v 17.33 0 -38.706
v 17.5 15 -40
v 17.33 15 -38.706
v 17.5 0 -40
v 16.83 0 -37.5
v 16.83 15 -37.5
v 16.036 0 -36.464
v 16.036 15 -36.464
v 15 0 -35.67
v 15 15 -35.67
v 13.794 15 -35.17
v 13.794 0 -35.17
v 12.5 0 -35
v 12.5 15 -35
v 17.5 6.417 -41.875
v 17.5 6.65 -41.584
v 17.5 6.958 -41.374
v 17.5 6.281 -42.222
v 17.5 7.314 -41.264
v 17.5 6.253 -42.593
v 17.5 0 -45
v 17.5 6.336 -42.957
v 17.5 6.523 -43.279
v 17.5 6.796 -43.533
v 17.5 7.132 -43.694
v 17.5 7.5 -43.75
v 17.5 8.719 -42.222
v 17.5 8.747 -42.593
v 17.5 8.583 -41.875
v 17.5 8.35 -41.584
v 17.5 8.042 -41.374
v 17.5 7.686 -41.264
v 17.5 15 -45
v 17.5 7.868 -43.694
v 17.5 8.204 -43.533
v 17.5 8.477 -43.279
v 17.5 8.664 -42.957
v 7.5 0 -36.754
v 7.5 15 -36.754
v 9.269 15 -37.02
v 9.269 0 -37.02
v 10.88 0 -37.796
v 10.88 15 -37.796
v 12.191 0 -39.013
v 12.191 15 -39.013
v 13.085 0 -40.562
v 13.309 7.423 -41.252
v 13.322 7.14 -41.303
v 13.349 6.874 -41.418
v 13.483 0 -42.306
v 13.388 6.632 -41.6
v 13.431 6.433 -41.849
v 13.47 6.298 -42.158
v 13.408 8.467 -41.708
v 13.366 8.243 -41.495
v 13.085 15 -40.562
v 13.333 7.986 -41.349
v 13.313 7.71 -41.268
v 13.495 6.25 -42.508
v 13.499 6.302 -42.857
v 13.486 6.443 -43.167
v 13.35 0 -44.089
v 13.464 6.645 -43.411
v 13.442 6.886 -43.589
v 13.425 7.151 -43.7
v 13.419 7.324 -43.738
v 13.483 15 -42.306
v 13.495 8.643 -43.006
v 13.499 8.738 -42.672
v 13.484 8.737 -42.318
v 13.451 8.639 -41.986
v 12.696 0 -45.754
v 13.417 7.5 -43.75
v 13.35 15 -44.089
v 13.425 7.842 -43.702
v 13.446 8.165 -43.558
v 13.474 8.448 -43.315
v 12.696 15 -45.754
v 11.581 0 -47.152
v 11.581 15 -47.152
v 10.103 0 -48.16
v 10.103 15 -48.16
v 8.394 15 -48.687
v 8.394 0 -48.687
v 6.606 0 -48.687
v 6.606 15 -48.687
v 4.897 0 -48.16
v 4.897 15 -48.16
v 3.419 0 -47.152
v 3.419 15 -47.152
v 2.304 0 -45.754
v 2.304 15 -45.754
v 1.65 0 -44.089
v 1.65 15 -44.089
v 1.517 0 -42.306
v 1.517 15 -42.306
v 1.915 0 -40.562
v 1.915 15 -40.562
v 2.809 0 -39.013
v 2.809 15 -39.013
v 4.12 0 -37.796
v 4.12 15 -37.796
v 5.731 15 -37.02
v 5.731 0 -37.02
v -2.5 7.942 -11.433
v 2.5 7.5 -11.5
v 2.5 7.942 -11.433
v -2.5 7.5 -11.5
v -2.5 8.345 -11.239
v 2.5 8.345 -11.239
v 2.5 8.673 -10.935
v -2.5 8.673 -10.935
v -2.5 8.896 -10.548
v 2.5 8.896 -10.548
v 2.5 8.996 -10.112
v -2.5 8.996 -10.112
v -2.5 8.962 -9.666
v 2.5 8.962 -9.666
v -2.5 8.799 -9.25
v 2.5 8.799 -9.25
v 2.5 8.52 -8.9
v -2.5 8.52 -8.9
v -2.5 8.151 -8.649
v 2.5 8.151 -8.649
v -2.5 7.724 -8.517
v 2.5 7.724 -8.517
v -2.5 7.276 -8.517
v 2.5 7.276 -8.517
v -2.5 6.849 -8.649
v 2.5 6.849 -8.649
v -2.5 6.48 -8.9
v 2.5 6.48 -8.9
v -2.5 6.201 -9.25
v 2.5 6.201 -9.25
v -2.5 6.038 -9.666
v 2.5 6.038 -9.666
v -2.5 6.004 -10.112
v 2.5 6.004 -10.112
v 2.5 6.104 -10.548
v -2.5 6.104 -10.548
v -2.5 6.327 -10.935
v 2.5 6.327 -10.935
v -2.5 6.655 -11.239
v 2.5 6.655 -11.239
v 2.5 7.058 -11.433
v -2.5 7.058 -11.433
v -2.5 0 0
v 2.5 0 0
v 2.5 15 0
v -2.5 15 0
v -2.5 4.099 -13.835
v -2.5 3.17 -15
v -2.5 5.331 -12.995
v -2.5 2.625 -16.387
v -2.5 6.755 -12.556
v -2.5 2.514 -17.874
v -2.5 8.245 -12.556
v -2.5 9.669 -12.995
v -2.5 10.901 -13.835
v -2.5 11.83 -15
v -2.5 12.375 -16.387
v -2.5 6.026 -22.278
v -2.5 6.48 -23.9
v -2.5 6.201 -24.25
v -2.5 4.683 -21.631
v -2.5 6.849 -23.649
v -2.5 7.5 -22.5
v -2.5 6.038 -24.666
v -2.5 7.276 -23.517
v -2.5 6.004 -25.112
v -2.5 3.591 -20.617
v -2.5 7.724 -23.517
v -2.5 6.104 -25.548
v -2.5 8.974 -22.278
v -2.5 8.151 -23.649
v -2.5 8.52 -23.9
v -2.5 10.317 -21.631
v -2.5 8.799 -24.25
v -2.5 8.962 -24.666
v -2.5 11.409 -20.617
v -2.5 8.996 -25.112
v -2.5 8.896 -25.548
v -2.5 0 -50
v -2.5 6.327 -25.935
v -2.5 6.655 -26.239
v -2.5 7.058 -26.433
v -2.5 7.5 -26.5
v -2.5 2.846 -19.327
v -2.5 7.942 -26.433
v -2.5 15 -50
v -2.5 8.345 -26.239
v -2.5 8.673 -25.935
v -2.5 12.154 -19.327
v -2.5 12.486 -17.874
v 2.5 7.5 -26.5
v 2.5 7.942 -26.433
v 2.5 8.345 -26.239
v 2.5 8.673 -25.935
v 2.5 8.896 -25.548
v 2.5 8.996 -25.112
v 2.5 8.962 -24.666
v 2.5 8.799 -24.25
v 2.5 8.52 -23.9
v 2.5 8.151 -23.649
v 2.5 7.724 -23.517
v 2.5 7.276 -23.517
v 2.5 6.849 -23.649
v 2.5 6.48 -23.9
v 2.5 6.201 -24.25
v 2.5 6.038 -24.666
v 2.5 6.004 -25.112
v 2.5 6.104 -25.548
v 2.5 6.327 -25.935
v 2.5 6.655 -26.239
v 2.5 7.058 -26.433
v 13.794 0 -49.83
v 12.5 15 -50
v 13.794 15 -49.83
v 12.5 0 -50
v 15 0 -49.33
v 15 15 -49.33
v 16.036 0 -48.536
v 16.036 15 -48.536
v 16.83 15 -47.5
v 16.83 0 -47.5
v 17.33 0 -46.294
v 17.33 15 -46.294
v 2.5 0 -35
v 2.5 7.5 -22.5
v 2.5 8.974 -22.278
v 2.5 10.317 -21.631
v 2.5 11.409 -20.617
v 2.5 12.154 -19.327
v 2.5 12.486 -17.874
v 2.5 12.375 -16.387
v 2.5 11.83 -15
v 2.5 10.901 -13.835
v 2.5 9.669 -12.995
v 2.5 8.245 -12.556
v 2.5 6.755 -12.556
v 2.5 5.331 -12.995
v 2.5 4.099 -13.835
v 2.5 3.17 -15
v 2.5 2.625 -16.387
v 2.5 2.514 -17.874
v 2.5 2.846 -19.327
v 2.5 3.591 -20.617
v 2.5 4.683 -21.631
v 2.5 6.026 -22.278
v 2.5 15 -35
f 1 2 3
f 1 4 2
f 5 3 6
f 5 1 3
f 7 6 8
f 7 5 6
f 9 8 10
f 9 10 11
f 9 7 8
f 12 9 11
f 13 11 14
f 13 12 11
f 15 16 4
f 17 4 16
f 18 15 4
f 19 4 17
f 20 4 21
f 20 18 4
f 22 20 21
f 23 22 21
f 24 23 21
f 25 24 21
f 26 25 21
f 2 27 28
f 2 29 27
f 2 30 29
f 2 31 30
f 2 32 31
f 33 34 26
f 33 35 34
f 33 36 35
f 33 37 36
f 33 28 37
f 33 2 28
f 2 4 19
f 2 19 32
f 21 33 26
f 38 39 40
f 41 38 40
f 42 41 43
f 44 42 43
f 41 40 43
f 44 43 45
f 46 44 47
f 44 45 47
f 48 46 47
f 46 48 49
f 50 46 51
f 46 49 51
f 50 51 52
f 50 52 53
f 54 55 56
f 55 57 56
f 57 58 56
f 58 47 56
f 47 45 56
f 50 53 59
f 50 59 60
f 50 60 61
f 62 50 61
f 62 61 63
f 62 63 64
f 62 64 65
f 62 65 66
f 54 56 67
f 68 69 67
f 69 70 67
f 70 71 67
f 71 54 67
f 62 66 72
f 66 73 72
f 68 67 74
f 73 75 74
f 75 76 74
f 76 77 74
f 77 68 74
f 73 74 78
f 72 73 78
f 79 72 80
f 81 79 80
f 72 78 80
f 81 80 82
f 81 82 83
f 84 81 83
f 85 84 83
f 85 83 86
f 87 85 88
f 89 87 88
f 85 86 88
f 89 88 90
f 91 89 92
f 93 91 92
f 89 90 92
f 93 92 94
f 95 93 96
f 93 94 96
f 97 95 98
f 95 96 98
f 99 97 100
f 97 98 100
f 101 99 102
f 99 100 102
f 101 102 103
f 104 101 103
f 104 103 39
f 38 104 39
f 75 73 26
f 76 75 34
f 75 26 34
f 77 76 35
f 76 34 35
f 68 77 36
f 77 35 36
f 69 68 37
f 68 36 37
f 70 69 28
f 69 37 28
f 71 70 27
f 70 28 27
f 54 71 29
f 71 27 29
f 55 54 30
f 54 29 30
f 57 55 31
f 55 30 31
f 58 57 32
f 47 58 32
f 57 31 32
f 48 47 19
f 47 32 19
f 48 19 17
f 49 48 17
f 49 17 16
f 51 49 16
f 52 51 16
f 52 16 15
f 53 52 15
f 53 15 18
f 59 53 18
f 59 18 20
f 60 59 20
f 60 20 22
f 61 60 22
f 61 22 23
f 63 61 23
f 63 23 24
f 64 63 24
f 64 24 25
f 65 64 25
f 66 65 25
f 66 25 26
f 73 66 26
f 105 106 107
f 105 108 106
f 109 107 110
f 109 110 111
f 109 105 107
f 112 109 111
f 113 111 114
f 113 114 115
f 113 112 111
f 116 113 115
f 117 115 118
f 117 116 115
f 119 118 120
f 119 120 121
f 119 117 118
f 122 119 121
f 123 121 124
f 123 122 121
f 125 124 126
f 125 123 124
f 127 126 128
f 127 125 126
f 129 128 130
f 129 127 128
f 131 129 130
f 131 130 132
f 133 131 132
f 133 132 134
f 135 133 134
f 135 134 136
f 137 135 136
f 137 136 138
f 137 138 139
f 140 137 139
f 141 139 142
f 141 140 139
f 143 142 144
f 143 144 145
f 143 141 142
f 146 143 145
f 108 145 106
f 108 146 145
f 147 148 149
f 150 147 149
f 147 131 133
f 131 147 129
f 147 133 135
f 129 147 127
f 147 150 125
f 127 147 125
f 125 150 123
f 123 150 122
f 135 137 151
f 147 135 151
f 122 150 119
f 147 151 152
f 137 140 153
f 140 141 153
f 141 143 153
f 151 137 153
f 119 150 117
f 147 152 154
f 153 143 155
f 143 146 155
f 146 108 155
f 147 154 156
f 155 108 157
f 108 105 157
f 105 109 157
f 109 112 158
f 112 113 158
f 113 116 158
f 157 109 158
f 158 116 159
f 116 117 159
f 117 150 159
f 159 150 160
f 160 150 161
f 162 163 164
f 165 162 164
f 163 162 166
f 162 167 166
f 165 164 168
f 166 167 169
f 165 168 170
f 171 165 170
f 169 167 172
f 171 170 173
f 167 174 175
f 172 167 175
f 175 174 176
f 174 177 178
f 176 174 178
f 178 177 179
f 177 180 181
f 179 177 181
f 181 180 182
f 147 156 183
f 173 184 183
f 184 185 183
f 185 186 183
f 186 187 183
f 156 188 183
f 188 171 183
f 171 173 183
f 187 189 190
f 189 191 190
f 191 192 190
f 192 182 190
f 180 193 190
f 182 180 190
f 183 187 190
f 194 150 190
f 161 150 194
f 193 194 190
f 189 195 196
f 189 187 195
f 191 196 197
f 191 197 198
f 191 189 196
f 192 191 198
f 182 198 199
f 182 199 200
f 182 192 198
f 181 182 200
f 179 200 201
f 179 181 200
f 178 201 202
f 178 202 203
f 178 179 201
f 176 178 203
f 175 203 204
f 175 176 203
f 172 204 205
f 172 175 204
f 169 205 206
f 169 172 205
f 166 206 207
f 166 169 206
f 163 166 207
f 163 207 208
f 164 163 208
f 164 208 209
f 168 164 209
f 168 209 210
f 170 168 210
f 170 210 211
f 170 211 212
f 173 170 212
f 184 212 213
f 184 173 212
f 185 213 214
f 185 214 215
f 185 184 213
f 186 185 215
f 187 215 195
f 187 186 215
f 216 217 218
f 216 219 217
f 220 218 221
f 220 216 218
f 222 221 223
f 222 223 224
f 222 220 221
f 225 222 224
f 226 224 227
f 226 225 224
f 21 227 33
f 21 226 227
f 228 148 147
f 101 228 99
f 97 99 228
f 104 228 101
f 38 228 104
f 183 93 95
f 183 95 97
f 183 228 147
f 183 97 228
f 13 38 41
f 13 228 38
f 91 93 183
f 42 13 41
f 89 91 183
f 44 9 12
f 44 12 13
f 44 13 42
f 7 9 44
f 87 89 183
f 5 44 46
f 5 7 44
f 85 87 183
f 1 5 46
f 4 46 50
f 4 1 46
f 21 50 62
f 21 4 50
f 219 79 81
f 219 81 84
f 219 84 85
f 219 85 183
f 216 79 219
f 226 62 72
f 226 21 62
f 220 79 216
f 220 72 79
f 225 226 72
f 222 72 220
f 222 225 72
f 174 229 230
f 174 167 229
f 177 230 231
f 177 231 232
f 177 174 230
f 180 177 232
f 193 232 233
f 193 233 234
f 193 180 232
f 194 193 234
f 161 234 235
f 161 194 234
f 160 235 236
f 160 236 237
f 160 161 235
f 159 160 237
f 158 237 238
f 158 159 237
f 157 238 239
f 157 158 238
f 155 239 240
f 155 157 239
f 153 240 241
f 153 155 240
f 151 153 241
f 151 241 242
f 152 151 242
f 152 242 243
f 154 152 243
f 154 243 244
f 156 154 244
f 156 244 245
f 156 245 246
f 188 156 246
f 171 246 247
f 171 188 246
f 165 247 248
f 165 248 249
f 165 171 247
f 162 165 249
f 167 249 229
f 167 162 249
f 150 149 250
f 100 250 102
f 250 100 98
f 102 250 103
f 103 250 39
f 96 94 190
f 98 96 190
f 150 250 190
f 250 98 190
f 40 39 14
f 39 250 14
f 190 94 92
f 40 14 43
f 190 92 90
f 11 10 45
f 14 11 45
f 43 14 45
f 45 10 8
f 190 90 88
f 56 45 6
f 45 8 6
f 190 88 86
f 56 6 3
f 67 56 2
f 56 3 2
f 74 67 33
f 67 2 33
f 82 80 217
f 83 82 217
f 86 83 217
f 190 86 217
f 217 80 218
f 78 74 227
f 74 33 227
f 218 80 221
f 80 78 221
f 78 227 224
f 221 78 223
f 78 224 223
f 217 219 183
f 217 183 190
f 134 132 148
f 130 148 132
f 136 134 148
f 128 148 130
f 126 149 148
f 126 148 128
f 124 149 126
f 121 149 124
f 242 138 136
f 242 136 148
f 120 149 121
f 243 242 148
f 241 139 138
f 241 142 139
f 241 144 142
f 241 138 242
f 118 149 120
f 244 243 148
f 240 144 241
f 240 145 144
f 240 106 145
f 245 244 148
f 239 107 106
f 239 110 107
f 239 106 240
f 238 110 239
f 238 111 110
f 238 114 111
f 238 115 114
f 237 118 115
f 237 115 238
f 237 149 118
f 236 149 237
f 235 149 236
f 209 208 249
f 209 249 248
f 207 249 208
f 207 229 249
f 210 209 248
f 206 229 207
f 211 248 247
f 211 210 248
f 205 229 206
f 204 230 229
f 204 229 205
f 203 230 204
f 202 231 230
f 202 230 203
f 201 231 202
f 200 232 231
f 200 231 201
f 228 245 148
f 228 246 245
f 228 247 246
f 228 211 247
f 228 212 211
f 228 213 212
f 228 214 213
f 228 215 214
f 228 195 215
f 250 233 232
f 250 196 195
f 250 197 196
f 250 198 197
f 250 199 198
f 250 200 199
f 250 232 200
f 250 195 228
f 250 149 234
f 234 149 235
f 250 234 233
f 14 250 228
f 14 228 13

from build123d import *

# Parameters (mm, degrees)
SKETCH1_W           = 50
SKETCH1_H           = 15
SKETCH1_R           = 1.5
SKETCH1_R_2         = 5
BOSS_EXTRUDE1_DEPTH = 2.5
SKETCH2_R           = 6
CUT_EXTRUDE1_DEPTH  = 1000
SKETCH5_W           = 20
SKETCH5_H           = 15
BOSS_EXTRUDE2_DEPTH = 15
SKETCH2_5_R         = 6
CUT_EXTRUDE2_DEPTH  = 15
FILLET1_R           = 5
SKETCH6_R           = 1.25
CUT_EXTRUDE3_DEPTH  = 15


with BuildPart() as part:
    # Sketch1 → Boss-Extrude1 (new, symmetric)
    with BuildSketch(Plane(origin=(0, 0, 0), x_dir=(0, 0, -1), z_dir=(1, 0, 0))):
        with Locations((25, 7.5)):
            Rectangle(SKETCH1_W, SKETCH1_H)
        with Locations((10, 7.5)):
            Circle(SKETCH1_R, mode=Mode.SUBTRACT)
        with Locations((17.5, 7.5)):
            Circle(SKETCH1_R_2, mode=Mode.SUBTRACT)
        with Locations((25, 7.5)):
            Circle(SKETCH1_R, mode=Mode.SUBTRACT)
    extrude(amount=BOSS_EXTRUDE1_DEPTH, both=True)

    # Sketch2 → Cut-Extrude1 (cut)
    with BuildSketch(Plane(origin=(0, 15, 0), x_dir=(1, 0, 0), z_dir=(0, 1, 0))):
        with Locations((7.5, 42.75390625)):
            Circle(SKETCH2_R)
    extrude(amount=-CUT_EXTRUDE1_DEPTH, mode=Mode.SUBTRACT)

    # Sketch5 → Boss-Extrude2 (add)
    with BuildSketch(Plane(origin=(0, 15, 0), x_dir=(1, 0, 0), z_dir=(0, 1, 0))):
        with Locations((7.5, 42.5)):
            Rectangle(SKETCH5_W, SKETCH5_H)
    extrude(amount=-BOSS_EXTRUDE2_DEPTH)

    # Sketch2<5> → Cut-Extrude2 (cut)
    with BuildSketch(Plane(origin=(0, 15, 0), x_dir=(1, 0, 0), z_dir=(0, 1, 0))):
        with Locations((7.5, 42.75390625)):
            Circle(SKETCH2_5_R)
    extrude(amount=-CUT_EXTRUDE2_DEPTH, mode=Mode.SUBTRACT)

    # Fillet1
    fillet1_edges = [part.edges().sort_by_distance(p)[0] for p in [
        (17.5, 7.5, -35),
        (17.5, 7.5, -50),
    ]]
    fillet(fillet1_edges, radius=FILLET1_R)

    # Sketch6 → Cut-Extrude3 (cut)
    with BuildSketch(Plane(origin=(17.5, 0, 0), x_dir=(0, 0, -1), z_dir=(1, 0, 0))):
        with Locations((42.5, 7.5)):
            Circle(SKETCH6_R)
    extrude(amount=-CUT_EXTRUDE3_DEPTH, mode=Mode.SUBTRACT)


solid = part.part
